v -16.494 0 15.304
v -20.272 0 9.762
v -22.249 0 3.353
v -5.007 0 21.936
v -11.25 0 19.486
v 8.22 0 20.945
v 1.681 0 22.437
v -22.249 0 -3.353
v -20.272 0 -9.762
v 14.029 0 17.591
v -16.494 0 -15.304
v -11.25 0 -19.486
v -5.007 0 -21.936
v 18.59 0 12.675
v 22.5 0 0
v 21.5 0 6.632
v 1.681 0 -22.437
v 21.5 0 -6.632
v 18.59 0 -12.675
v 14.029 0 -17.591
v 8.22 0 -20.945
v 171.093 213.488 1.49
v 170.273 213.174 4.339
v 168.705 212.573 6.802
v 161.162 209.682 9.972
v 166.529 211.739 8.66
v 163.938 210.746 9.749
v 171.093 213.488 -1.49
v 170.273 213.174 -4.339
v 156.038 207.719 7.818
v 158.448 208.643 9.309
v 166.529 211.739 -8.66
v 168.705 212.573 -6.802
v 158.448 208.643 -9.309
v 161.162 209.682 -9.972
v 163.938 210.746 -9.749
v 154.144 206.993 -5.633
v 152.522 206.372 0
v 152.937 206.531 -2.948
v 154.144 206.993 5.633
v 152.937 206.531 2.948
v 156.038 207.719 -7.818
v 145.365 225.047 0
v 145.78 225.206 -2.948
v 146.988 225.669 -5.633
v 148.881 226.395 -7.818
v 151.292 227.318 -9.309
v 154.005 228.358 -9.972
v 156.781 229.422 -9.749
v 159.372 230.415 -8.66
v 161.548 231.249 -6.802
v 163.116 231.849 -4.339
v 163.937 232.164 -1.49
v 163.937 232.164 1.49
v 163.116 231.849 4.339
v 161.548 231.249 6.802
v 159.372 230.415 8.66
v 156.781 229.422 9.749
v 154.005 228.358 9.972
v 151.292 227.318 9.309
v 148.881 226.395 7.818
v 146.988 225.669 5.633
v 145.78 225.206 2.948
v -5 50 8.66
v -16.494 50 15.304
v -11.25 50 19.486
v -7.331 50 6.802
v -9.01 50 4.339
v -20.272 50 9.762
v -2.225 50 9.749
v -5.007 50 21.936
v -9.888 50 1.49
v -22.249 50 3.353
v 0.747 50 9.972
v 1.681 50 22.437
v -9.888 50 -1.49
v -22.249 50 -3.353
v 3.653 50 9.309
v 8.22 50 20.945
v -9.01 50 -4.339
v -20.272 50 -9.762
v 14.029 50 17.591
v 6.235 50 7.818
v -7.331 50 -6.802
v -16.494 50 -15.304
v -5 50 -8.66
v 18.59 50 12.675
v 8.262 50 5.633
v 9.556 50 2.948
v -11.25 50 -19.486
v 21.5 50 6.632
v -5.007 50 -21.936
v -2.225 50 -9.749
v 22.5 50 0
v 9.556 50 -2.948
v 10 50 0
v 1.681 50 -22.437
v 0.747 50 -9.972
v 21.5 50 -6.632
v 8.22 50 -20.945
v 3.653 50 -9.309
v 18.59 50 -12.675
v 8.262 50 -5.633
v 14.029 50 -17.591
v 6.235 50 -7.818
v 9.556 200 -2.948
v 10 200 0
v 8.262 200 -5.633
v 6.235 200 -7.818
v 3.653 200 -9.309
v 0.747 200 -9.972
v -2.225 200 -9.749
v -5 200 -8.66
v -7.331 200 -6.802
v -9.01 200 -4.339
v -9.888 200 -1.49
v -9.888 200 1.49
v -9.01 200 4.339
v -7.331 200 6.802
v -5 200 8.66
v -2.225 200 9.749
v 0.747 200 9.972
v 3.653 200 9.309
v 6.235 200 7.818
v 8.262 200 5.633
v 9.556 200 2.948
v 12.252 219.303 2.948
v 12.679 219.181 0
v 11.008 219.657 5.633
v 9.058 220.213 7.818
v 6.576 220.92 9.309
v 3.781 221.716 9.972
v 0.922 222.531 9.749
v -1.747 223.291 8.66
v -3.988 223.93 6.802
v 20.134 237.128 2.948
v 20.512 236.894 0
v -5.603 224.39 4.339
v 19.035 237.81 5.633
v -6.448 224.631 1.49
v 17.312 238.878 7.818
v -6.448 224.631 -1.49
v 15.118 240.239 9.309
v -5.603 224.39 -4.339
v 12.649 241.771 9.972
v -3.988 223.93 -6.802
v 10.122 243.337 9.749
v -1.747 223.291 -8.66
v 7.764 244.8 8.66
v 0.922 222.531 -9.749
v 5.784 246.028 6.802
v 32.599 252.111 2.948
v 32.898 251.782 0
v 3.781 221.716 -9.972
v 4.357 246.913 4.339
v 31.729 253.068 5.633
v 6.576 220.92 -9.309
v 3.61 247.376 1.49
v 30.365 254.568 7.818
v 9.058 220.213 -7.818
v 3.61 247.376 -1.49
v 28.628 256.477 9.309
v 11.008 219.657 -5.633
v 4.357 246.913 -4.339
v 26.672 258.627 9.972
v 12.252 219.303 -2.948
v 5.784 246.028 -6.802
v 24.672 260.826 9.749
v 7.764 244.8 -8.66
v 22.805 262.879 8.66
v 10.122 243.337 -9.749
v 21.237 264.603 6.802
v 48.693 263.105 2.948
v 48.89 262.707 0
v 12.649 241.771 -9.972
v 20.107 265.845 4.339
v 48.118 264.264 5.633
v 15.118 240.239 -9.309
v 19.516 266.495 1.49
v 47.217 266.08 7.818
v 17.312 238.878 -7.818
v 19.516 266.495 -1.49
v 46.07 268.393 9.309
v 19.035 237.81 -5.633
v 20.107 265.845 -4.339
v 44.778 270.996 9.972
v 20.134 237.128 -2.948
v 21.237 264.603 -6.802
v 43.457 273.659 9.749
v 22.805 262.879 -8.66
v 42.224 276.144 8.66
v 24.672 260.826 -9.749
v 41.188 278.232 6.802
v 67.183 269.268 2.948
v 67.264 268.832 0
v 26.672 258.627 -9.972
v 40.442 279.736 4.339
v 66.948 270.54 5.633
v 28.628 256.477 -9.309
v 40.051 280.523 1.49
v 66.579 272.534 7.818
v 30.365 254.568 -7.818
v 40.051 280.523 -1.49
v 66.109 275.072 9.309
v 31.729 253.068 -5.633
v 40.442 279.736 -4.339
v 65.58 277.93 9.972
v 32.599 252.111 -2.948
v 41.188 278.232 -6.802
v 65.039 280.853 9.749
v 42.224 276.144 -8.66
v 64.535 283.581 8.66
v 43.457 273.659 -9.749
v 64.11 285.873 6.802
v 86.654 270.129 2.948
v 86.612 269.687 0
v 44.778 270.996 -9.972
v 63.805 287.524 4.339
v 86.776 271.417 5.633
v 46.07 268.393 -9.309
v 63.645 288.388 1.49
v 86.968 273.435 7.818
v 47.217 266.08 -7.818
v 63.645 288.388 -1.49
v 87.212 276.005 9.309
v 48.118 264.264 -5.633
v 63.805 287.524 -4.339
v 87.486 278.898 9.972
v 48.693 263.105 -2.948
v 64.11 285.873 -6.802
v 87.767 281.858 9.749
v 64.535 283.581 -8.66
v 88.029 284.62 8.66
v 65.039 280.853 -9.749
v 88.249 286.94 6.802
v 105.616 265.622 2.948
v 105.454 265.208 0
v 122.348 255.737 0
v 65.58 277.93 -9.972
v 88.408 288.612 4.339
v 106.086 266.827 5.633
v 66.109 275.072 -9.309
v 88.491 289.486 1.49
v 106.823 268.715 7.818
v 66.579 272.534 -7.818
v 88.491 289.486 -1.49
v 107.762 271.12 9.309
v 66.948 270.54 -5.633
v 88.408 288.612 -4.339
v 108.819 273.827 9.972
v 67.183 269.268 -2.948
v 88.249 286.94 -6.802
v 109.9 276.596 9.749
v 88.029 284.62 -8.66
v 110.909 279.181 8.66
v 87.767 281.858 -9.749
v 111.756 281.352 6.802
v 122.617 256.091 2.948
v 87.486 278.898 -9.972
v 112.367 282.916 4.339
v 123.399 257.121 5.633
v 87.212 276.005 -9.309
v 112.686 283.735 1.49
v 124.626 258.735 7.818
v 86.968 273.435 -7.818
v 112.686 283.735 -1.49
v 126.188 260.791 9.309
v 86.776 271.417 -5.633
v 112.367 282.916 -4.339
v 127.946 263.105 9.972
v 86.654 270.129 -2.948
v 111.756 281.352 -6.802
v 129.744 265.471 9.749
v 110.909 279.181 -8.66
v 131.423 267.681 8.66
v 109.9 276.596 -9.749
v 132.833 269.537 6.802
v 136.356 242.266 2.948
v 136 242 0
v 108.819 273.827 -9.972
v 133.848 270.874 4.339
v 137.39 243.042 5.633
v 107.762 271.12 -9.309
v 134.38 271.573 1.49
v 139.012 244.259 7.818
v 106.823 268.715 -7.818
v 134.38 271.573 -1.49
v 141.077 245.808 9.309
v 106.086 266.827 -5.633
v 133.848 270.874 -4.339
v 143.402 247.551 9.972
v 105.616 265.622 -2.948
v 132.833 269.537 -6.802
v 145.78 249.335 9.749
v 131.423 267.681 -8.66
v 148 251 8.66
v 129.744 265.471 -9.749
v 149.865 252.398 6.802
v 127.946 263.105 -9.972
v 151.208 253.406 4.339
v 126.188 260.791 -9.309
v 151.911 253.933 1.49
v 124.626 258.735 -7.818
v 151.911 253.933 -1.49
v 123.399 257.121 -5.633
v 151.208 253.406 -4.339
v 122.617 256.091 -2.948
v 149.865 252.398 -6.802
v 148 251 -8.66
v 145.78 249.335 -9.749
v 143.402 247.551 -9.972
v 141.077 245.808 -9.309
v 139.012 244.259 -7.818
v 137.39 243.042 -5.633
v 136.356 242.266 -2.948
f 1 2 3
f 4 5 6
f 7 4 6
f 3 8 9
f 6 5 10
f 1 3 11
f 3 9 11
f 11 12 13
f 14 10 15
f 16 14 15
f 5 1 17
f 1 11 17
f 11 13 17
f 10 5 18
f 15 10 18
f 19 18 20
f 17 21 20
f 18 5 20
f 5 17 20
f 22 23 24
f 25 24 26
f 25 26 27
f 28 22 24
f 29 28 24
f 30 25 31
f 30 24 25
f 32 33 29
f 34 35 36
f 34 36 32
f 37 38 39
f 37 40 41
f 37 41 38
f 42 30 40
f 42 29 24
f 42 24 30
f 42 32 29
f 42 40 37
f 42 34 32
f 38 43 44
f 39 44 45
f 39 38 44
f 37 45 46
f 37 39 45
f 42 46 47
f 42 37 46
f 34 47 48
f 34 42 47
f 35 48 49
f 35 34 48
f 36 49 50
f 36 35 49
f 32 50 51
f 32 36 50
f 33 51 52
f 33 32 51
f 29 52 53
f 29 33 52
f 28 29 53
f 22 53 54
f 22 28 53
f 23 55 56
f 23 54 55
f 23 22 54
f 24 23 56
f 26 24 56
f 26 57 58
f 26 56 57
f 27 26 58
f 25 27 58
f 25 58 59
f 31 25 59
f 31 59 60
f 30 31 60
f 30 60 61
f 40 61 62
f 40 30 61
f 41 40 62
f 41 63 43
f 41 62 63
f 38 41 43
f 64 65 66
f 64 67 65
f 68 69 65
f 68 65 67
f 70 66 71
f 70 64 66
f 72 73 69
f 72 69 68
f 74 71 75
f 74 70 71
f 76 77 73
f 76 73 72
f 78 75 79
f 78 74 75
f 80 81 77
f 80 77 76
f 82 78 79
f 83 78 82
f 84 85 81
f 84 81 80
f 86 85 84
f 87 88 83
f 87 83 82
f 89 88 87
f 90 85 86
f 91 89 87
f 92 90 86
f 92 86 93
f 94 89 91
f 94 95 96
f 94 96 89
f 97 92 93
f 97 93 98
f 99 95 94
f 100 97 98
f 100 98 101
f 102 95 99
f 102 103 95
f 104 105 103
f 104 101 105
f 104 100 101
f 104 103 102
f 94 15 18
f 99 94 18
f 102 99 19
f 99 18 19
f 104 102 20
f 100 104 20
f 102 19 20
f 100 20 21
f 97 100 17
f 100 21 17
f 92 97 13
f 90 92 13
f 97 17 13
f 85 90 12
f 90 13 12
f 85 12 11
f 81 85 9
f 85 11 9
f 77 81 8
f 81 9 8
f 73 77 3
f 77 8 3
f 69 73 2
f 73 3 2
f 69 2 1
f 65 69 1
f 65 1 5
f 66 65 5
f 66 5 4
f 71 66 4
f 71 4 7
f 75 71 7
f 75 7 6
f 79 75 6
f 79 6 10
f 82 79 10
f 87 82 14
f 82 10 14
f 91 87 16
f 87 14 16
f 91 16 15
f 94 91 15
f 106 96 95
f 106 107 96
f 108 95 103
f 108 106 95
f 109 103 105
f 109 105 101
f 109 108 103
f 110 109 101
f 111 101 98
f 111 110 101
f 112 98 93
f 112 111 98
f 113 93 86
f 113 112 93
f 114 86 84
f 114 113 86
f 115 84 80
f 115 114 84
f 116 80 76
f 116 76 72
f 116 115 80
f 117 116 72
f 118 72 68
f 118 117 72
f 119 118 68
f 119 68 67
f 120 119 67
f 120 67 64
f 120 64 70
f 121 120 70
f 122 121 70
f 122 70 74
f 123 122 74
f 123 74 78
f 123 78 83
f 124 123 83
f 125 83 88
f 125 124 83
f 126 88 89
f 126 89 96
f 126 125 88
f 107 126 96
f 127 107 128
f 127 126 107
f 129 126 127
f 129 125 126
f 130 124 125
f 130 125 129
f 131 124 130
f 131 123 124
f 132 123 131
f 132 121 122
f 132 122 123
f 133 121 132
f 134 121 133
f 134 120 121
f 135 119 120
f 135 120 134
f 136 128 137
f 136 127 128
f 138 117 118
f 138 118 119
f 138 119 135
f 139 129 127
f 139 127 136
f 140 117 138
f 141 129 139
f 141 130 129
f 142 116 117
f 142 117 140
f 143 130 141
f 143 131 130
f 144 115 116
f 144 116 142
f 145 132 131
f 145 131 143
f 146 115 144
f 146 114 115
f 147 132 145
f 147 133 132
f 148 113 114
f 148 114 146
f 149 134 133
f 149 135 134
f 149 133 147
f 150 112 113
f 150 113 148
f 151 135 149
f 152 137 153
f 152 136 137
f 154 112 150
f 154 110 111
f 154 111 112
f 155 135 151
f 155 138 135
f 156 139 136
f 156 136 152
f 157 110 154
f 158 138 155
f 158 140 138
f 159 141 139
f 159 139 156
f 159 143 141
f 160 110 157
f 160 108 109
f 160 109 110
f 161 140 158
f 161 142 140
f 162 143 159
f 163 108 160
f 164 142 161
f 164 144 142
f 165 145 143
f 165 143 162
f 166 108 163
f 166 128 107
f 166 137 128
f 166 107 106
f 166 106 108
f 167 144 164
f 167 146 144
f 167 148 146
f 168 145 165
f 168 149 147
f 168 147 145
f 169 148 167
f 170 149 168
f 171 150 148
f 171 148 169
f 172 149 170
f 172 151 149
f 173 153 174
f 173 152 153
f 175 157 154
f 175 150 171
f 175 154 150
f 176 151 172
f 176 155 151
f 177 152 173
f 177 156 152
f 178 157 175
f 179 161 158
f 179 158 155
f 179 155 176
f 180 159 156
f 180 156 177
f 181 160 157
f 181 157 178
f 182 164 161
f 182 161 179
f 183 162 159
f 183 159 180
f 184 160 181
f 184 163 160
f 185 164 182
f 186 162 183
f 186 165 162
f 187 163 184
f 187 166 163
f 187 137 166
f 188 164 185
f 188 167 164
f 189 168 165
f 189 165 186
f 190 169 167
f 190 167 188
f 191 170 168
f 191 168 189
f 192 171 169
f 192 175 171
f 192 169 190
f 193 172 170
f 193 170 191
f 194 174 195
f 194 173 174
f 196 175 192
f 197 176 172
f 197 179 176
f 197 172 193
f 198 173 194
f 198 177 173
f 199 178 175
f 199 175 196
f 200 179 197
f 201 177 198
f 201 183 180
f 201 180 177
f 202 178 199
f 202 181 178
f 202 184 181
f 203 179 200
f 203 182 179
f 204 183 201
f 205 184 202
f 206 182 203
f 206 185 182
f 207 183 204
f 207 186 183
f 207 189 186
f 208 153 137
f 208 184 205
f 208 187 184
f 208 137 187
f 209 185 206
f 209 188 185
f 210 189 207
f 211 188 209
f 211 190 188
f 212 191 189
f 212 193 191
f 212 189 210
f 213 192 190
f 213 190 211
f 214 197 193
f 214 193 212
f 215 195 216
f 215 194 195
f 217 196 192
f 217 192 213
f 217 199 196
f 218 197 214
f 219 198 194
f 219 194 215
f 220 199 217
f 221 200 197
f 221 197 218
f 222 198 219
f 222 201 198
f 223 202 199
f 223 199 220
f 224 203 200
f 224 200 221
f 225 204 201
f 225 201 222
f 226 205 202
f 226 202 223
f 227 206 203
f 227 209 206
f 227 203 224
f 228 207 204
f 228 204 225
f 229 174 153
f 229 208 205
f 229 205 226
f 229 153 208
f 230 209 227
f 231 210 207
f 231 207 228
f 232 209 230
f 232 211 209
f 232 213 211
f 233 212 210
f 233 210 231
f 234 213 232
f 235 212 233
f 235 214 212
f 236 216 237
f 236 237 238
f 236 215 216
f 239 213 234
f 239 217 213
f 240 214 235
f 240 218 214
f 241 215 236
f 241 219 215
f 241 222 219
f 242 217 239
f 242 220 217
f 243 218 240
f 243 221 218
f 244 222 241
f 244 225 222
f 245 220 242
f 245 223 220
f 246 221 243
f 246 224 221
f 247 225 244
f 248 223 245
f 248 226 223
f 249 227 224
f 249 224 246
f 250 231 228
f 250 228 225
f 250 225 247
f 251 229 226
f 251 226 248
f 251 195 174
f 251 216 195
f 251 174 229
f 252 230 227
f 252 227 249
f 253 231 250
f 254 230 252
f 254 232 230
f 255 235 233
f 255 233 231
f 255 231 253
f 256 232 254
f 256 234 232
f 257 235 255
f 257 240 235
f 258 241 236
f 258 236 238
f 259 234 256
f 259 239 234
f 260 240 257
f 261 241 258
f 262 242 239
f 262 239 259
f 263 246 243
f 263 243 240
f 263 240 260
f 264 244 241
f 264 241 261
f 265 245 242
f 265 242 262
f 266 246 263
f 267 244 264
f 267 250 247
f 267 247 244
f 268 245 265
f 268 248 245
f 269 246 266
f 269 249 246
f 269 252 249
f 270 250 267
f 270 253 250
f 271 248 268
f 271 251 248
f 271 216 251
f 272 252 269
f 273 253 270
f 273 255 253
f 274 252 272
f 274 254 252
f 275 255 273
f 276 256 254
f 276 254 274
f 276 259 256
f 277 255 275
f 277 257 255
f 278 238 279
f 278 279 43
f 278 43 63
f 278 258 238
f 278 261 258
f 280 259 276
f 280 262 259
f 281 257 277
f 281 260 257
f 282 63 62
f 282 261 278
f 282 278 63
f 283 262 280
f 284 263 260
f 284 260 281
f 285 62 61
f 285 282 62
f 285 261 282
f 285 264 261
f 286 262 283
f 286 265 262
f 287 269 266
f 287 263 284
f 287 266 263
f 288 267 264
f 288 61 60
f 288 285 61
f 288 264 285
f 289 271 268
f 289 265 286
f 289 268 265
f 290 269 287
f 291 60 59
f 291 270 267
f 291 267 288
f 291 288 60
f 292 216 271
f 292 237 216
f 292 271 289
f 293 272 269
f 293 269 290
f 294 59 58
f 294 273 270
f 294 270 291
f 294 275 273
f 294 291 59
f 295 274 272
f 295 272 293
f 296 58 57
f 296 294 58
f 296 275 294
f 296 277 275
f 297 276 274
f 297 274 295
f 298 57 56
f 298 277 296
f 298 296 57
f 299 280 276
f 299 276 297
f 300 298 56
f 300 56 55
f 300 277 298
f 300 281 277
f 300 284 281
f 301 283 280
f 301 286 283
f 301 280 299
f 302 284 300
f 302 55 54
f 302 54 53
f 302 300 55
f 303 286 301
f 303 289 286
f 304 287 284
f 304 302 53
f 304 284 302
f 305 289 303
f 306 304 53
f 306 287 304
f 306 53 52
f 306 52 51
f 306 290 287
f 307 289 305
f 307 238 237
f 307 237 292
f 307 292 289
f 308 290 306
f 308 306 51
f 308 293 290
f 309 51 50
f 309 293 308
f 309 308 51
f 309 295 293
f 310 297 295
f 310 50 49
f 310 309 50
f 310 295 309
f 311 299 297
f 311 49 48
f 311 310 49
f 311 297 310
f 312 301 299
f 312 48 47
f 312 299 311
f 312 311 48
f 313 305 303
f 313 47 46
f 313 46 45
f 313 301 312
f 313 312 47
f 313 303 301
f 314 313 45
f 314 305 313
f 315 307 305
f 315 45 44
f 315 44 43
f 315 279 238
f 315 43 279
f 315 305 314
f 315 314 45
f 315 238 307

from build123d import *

# Parameters (mm, degrees)
SKETCH_2_R      = 10
SKETCH_3_R      = 22.5
EXTRUDE_1_DEPTH = 50


with BuildPart() as part:
    # По траектории1: sweep along a path in Эскиз1
    with BuildLine(Plane.XY) as sweep_1_path:
        Line((0, 0), (0, 200))
        ThreePointArc((0, 200), (65.444238832, 278.664666889), (154.703245421, 228.62560259))
        Line((154.703245421, 228.62560259), (161.859646068, 209.949791235))
    # Эскиз2 → По траектории1 (sweep)
    with BuildSketch(Plane(origin=(0, 0, 0), x_dir=(1, 0, 0), z_dir=(0, 1, 0))):
        Circle(SKETCH_2_R)
    sweep(path=sweep_1_path.line)

    # Эскиз3 → Бобышка-Вытянуть1 (add)
    with BuildSketch(Plane(origin=(0, 0, 0), x_dir=(1, 0, 0), z_dir=(0, 1, 0))):
        Circle(SKETCH_3_R)
    extrude(amount=EXTRUDE_1_DEPTH)


solid = part.part
